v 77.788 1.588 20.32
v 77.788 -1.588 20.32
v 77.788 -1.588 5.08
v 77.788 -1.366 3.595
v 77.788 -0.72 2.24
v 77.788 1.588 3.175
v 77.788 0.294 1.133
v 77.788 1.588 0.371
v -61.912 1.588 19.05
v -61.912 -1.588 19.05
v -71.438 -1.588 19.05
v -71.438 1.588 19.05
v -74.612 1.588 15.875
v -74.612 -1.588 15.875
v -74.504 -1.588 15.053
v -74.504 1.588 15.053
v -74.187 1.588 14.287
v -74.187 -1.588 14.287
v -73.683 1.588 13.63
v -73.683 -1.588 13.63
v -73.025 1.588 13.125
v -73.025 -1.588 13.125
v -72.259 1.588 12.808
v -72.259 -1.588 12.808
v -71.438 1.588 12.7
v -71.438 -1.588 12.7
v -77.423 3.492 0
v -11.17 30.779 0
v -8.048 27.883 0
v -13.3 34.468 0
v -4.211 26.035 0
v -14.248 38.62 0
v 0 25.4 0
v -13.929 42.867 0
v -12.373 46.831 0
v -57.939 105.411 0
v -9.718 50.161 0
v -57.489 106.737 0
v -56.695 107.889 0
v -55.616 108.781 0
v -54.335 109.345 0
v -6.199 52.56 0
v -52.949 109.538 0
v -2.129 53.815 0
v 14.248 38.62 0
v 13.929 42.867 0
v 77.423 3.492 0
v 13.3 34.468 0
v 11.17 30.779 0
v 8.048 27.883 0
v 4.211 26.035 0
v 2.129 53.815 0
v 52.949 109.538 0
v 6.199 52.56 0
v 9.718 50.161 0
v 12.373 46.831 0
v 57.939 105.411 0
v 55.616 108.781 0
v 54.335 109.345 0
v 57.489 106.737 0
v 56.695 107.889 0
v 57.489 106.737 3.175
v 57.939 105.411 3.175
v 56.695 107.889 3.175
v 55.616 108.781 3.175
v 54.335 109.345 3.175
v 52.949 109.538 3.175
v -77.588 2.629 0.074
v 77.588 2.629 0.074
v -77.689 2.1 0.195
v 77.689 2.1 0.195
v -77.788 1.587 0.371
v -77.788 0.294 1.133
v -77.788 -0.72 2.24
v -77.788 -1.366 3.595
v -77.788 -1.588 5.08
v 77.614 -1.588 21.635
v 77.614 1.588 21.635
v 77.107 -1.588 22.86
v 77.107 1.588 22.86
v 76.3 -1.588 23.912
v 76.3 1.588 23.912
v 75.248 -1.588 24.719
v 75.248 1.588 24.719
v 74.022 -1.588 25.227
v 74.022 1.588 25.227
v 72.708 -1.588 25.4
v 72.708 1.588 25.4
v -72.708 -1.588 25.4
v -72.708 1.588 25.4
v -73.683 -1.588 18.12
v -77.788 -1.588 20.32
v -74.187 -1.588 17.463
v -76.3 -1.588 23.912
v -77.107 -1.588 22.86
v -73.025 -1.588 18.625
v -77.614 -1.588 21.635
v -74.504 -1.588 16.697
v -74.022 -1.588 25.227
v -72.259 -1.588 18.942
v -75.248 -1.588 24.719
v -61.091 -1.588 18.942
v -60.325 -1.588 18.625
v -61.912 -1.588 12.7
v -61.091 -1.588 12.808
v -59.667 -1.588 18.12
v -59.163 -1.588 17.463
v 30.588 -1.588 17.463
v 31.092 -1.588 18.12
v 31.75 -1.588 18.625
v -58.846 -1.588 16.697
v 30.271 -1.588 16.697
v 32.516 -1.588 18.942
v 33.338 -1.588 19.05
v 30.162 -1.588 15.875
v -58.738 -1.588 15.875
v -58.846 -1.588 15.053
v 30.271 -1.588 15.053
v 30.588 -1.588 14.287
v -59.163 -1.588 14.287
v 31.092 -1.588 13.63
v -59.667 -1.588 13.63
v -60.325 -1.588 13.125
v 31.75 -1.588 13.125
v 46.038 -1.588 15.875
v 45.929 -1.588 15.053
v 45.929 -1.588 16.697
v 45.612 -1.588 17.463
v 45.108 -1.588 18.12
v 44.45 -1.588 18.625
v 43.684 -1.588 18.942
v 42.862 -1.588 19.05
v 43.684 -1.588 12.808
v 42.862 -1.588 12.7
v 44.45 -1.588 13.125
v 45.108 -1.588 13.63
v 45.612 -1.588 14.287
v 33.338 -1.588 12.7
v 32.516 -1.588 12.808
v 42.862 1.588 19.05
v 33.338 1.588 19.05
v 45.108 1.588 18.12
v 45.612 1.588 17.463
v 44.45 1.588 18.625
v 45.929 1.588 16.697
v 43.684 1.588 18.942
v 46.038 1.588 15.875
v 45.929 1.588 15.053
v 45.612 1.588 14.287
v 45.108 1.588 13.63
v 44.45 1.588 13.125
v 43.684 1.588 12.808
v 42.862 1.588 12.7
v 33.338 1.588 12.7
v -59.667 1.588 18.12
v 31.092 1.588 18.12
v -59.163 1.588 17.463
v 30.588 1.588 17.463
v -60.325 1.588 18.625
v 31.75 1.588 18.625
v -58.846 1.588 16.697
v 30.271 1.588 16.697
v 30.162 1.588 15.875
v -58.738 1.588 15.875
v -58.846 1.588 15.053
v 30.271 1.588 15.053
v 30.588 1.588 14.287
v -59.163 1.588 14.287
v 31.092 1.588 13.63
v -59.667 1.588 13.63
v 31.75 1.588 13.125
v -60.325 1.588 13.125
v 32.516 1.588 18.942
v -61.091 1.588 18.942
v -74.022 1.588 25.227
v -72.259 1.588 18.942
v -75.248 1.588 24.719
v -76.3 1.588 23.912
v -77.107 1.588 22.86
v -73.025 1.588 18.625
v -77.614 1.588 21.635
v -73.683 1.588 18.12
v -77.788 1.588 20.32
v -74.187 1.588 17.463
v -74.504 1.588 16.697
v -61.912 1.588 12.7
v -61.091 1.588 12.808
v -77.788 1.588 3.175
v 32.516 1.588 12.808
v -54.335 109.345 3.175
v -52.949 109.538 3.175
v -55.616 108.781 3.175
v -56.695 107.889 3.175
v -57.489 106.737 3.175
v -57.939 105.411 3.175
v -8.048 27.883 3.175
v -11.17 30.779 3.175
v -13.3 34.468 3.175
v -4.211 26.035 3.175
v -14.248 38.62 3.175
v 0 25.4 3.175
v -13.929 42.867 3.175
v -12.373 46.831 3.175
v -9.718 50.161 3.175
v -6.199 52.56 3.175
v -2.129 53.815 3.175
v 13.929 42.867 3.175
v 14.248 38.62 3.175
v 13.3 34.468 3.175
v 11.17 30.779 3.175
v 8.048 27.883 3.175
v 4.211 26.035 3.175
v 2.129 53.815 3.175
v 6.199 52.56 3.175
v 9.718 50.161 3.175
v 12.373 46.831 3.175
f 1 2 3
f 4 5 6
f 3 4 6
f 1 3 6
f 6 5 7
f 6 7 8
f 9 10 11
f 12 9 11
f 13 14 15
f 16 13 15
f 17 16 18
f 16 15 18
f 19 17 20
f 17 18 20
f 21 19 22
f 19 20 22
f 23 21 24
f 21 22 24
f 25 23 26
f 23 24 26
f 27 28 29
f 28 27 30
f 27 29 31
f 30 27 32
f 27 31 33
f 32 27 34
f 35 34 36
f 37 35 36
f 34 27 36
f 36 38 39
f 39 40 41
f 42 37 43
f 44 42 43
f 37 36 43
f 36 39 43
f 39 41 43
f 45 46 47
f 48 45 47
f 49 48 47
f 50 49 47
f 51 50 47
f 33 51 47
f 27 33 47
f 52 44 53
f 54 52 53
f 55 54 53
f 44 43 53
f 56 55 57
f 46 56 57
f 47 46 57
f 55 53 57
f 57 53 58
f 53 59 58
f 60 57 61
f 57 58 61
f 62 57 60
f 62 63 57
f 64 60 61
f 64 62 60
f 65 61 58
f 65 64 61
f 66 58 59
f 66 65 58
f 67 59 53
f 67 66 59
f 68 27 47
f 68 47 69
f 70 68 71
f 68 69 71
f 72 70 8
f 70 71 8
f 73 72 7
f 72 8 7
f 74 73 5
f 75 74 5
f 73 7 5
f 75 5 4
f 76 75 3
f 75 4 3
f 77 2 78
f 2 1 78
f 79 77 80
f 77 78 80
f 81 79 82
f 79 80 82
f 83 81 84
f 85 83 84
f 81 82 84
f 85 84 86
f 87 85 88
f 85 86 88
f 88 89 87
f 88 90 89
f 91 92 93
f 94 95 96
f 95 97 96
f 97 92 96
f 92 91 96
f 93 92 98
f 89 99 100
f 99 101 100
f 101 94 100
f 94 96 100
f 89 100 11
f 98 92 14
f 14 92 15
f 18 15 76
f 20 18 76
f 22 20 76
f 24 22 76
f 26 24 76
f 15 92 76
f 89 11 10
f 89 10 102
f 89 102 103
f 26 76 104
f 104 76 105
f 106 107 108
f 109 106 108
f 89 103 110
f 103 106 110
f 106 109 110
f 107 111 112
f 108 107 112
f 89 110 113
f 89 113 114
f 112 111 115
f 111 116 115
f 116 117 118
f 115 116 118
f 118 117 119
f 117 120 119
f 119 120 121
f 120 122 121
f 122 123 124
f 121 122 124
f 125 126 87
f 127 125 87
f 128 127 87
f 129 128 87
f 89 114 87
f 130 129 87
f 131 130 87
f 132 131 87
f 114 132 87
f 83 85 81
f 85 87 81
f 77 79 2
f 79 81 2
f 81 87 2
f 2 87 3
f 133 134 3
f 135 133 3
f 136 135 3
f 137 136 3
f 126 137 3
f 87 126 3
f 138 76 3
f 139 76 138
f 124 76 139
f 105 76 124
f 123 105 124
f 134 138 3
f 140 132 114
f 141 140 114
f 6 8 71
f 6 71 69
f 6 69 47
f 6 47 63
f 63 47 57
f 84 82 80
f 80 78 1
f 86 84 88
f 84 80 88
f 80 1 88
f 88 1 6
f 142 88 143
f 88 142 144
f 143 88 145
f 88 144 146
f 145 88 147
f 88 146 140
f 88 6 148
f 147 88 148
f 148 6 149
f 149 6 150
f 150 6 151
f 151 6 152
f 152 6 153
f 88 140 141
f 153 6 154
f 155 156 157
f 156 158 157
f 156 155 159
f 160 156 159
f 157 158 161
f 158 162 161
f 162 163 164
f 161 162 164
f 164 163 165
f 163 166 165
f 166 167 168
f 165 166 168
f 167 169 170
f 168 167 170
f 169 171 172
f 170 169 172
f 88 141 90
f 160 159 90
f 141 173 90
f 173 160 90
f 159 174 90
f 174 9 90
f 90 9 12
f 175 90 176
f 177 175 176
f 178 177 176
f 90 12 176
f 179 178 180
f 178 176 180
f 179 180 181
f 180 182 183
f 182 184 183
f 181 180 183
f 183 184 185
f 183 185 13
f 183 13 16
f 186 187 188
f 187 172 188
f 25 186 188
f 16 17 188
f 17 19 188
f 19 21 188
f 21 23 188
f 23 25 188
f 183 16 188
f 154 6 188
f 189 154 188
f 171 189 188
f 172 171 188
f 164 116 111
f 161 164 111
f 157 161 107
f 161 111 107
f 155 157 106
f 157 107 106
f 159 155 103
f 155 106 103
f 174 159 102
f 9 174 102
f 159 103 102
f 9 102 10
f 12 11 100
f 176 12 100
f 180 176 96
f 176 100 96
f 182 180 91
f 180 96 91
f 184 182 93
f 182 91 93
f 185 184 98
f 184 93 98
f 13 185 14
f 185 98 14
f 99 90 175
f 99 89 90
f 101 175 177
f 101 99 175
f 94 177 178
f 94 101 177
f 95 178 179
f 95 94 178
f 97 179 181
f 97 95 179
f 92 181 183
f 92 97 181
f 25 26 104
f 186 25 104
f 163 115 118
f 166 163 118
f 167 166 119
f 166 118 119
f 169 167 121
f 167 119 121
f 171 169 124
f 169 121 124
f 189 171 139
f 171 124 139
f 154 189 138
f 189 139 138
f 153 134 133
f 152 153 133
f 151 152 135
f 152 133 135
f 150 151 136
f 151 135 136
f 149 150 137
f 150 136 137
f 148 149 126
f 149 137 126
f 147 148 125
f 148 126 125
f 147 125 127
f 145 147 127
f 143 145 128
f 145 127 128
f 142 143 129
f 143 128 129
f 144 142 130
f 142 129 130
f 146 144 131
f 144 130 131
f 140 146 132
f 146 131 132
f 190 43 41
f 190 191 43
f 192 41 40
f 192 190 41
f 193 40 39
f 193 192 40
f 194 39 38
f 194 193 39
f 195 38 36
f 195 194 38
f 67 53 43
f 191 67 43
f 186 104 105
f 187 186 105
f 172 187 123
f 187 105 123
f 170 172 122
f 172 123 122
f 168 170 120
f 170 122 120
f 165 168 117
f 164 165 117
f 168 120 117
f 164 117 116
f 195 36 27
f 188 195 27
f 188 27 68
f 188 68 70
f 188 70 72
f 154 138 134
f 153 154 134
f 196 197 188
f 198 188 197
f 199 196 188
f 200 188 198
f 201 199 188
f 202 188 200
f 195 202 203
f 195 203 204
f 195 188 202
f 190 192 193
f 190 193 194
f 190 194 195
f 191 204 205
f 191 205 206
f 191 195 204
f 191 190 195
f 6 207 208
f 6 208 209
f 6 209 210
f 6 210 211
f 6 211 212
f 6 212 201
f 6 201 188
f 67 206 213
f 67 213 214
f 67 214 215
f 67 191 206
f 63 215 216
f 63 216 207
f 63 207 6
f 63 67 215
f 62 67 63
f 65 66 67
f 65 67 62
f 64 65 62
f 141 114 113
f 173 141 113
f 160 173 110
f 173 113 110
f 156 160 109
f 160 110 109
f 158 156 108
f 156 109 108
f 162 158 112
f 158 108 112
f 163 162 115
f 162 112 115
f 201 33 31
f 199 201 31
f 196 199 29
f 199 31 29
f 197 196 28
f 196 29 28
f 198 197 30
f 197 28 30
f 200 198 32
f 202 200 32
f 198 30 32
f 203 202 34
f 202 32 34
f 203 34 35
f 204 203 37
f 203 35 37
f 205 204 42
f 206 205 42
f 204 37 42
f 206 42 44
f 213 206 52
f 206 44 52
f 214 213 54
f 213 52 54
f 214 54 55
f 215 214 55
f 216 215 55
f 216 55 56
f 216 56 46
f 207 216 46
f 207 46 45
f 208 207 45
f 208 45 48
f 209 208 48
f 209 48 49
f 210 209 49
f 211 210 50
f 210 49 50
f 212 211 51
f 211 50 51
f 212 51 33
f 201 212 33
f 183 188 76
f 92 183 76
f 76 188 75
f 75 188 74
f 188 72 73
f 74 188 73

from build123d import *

# Parameters (mm, degrees)
F1_DEPTH = 25.4
F2_DEPTH = 3.175
F3_R     = 5.08
F5_DEPTH = 25.4


# Not quite as in the source:
# - a feature names something its author has since deleted; it is built from what else it names


with BuildPart() as f1:
    # F0 (on Top) → F1 (new body)
    with BuildSketch(Plane.XY):
        Polygon((-77.7875, -1.5875), (77.7875, -1.5875), (77.7875, 1.5875), (0, 1.5875), (-77.7875, 1.5875), align=None)
    extrude(amount=F1_DEPTH)

    # F0 (on Top) → F2 (join)
    with BuildSketch(Plane.XY):
        Polygon((0, 1.5875), (77.7875, 1.5875), (57.15, 109.5375), (0, 109.5375), (-57.15, 109.5375), (-77.7875, 1.5875), align=None)
        with BuildLine():
            ThreePointArc((14.2875, 39.6875), (10.1027881362, 29.5847118638), (0, 25.4))
            ThreePointArc((0, 25.4), (-10.1027881362, 49.7902881362), (14.2875, 39.6875))
        make_face(mode=Mode.SUBTRACT)
    extrude(amount=F2_DEPTH)

    # F3
    f3_edges = [f1.edges().sort_by_distance(p)[0] for p in [
        (-77.7875, 0, 25.4),
        (77.7875, 0, 25.4),
        (0, -1.5875, 0),
        (57.15, 109.5375, 1.5875),
        (-57.15, 109.5375, 1.5875),
    ]]
    fillet(f3_edges, radius=F3_R)

    # F4 (on face) → F5 (cut)
    with BuildSketch(Plane.XZ.offset(1.5875)):
        with BuildLine():
            ThreePointArc((-71.4375, 19.05), (-73.6825640303, 18.1200640303), (-74.6125, 15.875))
            ThreePointArc((-74.6125, 15.875), (-73.6825640303, 13.6299359697), (-71.4375, 12.7))
            Line((-71.4375, 12.7), (-61.9125, 12.7))
            ThreePointArc((-61.9125, 12.7), (-59.6674359697, 13.6299359697), (-58.7375, 15.875))
            ThreePointArc((-58.7375, 15.875), (-59.6674359697, 18.1200640303), (-61.9125, 19.05))
            Line((-61.9125, 19.05), (-71.4375, 19.05))
        make_face()
        with BuildLine():
            ThreePointArc((46.0375, 15.875), (45.1075640303, 18.1200640303), (42.8625, 19.05))
            Line((42.8625, 19.05), (33.3375, 19.05))
            ThreePointArc((33.3375, 19.05), (31.0924359697, 18.1200640303), (30.1625, 15.875))
            ThreePointArc((30.1625, 15.875), (31.0924359697, 13.6299359697), (33.3375, 12.7))
            Line((33.3375, 12.7), (42.8625, 12.7))
            ThreePointArc((42.8625, 12.7), (45.1075640303, 13.6299359697), (46.0375, 15.875))
        make_face()
    extrude(amount=-F5_DEPTH, mode=Mode.SUBTRACT)


solid = f1.part
